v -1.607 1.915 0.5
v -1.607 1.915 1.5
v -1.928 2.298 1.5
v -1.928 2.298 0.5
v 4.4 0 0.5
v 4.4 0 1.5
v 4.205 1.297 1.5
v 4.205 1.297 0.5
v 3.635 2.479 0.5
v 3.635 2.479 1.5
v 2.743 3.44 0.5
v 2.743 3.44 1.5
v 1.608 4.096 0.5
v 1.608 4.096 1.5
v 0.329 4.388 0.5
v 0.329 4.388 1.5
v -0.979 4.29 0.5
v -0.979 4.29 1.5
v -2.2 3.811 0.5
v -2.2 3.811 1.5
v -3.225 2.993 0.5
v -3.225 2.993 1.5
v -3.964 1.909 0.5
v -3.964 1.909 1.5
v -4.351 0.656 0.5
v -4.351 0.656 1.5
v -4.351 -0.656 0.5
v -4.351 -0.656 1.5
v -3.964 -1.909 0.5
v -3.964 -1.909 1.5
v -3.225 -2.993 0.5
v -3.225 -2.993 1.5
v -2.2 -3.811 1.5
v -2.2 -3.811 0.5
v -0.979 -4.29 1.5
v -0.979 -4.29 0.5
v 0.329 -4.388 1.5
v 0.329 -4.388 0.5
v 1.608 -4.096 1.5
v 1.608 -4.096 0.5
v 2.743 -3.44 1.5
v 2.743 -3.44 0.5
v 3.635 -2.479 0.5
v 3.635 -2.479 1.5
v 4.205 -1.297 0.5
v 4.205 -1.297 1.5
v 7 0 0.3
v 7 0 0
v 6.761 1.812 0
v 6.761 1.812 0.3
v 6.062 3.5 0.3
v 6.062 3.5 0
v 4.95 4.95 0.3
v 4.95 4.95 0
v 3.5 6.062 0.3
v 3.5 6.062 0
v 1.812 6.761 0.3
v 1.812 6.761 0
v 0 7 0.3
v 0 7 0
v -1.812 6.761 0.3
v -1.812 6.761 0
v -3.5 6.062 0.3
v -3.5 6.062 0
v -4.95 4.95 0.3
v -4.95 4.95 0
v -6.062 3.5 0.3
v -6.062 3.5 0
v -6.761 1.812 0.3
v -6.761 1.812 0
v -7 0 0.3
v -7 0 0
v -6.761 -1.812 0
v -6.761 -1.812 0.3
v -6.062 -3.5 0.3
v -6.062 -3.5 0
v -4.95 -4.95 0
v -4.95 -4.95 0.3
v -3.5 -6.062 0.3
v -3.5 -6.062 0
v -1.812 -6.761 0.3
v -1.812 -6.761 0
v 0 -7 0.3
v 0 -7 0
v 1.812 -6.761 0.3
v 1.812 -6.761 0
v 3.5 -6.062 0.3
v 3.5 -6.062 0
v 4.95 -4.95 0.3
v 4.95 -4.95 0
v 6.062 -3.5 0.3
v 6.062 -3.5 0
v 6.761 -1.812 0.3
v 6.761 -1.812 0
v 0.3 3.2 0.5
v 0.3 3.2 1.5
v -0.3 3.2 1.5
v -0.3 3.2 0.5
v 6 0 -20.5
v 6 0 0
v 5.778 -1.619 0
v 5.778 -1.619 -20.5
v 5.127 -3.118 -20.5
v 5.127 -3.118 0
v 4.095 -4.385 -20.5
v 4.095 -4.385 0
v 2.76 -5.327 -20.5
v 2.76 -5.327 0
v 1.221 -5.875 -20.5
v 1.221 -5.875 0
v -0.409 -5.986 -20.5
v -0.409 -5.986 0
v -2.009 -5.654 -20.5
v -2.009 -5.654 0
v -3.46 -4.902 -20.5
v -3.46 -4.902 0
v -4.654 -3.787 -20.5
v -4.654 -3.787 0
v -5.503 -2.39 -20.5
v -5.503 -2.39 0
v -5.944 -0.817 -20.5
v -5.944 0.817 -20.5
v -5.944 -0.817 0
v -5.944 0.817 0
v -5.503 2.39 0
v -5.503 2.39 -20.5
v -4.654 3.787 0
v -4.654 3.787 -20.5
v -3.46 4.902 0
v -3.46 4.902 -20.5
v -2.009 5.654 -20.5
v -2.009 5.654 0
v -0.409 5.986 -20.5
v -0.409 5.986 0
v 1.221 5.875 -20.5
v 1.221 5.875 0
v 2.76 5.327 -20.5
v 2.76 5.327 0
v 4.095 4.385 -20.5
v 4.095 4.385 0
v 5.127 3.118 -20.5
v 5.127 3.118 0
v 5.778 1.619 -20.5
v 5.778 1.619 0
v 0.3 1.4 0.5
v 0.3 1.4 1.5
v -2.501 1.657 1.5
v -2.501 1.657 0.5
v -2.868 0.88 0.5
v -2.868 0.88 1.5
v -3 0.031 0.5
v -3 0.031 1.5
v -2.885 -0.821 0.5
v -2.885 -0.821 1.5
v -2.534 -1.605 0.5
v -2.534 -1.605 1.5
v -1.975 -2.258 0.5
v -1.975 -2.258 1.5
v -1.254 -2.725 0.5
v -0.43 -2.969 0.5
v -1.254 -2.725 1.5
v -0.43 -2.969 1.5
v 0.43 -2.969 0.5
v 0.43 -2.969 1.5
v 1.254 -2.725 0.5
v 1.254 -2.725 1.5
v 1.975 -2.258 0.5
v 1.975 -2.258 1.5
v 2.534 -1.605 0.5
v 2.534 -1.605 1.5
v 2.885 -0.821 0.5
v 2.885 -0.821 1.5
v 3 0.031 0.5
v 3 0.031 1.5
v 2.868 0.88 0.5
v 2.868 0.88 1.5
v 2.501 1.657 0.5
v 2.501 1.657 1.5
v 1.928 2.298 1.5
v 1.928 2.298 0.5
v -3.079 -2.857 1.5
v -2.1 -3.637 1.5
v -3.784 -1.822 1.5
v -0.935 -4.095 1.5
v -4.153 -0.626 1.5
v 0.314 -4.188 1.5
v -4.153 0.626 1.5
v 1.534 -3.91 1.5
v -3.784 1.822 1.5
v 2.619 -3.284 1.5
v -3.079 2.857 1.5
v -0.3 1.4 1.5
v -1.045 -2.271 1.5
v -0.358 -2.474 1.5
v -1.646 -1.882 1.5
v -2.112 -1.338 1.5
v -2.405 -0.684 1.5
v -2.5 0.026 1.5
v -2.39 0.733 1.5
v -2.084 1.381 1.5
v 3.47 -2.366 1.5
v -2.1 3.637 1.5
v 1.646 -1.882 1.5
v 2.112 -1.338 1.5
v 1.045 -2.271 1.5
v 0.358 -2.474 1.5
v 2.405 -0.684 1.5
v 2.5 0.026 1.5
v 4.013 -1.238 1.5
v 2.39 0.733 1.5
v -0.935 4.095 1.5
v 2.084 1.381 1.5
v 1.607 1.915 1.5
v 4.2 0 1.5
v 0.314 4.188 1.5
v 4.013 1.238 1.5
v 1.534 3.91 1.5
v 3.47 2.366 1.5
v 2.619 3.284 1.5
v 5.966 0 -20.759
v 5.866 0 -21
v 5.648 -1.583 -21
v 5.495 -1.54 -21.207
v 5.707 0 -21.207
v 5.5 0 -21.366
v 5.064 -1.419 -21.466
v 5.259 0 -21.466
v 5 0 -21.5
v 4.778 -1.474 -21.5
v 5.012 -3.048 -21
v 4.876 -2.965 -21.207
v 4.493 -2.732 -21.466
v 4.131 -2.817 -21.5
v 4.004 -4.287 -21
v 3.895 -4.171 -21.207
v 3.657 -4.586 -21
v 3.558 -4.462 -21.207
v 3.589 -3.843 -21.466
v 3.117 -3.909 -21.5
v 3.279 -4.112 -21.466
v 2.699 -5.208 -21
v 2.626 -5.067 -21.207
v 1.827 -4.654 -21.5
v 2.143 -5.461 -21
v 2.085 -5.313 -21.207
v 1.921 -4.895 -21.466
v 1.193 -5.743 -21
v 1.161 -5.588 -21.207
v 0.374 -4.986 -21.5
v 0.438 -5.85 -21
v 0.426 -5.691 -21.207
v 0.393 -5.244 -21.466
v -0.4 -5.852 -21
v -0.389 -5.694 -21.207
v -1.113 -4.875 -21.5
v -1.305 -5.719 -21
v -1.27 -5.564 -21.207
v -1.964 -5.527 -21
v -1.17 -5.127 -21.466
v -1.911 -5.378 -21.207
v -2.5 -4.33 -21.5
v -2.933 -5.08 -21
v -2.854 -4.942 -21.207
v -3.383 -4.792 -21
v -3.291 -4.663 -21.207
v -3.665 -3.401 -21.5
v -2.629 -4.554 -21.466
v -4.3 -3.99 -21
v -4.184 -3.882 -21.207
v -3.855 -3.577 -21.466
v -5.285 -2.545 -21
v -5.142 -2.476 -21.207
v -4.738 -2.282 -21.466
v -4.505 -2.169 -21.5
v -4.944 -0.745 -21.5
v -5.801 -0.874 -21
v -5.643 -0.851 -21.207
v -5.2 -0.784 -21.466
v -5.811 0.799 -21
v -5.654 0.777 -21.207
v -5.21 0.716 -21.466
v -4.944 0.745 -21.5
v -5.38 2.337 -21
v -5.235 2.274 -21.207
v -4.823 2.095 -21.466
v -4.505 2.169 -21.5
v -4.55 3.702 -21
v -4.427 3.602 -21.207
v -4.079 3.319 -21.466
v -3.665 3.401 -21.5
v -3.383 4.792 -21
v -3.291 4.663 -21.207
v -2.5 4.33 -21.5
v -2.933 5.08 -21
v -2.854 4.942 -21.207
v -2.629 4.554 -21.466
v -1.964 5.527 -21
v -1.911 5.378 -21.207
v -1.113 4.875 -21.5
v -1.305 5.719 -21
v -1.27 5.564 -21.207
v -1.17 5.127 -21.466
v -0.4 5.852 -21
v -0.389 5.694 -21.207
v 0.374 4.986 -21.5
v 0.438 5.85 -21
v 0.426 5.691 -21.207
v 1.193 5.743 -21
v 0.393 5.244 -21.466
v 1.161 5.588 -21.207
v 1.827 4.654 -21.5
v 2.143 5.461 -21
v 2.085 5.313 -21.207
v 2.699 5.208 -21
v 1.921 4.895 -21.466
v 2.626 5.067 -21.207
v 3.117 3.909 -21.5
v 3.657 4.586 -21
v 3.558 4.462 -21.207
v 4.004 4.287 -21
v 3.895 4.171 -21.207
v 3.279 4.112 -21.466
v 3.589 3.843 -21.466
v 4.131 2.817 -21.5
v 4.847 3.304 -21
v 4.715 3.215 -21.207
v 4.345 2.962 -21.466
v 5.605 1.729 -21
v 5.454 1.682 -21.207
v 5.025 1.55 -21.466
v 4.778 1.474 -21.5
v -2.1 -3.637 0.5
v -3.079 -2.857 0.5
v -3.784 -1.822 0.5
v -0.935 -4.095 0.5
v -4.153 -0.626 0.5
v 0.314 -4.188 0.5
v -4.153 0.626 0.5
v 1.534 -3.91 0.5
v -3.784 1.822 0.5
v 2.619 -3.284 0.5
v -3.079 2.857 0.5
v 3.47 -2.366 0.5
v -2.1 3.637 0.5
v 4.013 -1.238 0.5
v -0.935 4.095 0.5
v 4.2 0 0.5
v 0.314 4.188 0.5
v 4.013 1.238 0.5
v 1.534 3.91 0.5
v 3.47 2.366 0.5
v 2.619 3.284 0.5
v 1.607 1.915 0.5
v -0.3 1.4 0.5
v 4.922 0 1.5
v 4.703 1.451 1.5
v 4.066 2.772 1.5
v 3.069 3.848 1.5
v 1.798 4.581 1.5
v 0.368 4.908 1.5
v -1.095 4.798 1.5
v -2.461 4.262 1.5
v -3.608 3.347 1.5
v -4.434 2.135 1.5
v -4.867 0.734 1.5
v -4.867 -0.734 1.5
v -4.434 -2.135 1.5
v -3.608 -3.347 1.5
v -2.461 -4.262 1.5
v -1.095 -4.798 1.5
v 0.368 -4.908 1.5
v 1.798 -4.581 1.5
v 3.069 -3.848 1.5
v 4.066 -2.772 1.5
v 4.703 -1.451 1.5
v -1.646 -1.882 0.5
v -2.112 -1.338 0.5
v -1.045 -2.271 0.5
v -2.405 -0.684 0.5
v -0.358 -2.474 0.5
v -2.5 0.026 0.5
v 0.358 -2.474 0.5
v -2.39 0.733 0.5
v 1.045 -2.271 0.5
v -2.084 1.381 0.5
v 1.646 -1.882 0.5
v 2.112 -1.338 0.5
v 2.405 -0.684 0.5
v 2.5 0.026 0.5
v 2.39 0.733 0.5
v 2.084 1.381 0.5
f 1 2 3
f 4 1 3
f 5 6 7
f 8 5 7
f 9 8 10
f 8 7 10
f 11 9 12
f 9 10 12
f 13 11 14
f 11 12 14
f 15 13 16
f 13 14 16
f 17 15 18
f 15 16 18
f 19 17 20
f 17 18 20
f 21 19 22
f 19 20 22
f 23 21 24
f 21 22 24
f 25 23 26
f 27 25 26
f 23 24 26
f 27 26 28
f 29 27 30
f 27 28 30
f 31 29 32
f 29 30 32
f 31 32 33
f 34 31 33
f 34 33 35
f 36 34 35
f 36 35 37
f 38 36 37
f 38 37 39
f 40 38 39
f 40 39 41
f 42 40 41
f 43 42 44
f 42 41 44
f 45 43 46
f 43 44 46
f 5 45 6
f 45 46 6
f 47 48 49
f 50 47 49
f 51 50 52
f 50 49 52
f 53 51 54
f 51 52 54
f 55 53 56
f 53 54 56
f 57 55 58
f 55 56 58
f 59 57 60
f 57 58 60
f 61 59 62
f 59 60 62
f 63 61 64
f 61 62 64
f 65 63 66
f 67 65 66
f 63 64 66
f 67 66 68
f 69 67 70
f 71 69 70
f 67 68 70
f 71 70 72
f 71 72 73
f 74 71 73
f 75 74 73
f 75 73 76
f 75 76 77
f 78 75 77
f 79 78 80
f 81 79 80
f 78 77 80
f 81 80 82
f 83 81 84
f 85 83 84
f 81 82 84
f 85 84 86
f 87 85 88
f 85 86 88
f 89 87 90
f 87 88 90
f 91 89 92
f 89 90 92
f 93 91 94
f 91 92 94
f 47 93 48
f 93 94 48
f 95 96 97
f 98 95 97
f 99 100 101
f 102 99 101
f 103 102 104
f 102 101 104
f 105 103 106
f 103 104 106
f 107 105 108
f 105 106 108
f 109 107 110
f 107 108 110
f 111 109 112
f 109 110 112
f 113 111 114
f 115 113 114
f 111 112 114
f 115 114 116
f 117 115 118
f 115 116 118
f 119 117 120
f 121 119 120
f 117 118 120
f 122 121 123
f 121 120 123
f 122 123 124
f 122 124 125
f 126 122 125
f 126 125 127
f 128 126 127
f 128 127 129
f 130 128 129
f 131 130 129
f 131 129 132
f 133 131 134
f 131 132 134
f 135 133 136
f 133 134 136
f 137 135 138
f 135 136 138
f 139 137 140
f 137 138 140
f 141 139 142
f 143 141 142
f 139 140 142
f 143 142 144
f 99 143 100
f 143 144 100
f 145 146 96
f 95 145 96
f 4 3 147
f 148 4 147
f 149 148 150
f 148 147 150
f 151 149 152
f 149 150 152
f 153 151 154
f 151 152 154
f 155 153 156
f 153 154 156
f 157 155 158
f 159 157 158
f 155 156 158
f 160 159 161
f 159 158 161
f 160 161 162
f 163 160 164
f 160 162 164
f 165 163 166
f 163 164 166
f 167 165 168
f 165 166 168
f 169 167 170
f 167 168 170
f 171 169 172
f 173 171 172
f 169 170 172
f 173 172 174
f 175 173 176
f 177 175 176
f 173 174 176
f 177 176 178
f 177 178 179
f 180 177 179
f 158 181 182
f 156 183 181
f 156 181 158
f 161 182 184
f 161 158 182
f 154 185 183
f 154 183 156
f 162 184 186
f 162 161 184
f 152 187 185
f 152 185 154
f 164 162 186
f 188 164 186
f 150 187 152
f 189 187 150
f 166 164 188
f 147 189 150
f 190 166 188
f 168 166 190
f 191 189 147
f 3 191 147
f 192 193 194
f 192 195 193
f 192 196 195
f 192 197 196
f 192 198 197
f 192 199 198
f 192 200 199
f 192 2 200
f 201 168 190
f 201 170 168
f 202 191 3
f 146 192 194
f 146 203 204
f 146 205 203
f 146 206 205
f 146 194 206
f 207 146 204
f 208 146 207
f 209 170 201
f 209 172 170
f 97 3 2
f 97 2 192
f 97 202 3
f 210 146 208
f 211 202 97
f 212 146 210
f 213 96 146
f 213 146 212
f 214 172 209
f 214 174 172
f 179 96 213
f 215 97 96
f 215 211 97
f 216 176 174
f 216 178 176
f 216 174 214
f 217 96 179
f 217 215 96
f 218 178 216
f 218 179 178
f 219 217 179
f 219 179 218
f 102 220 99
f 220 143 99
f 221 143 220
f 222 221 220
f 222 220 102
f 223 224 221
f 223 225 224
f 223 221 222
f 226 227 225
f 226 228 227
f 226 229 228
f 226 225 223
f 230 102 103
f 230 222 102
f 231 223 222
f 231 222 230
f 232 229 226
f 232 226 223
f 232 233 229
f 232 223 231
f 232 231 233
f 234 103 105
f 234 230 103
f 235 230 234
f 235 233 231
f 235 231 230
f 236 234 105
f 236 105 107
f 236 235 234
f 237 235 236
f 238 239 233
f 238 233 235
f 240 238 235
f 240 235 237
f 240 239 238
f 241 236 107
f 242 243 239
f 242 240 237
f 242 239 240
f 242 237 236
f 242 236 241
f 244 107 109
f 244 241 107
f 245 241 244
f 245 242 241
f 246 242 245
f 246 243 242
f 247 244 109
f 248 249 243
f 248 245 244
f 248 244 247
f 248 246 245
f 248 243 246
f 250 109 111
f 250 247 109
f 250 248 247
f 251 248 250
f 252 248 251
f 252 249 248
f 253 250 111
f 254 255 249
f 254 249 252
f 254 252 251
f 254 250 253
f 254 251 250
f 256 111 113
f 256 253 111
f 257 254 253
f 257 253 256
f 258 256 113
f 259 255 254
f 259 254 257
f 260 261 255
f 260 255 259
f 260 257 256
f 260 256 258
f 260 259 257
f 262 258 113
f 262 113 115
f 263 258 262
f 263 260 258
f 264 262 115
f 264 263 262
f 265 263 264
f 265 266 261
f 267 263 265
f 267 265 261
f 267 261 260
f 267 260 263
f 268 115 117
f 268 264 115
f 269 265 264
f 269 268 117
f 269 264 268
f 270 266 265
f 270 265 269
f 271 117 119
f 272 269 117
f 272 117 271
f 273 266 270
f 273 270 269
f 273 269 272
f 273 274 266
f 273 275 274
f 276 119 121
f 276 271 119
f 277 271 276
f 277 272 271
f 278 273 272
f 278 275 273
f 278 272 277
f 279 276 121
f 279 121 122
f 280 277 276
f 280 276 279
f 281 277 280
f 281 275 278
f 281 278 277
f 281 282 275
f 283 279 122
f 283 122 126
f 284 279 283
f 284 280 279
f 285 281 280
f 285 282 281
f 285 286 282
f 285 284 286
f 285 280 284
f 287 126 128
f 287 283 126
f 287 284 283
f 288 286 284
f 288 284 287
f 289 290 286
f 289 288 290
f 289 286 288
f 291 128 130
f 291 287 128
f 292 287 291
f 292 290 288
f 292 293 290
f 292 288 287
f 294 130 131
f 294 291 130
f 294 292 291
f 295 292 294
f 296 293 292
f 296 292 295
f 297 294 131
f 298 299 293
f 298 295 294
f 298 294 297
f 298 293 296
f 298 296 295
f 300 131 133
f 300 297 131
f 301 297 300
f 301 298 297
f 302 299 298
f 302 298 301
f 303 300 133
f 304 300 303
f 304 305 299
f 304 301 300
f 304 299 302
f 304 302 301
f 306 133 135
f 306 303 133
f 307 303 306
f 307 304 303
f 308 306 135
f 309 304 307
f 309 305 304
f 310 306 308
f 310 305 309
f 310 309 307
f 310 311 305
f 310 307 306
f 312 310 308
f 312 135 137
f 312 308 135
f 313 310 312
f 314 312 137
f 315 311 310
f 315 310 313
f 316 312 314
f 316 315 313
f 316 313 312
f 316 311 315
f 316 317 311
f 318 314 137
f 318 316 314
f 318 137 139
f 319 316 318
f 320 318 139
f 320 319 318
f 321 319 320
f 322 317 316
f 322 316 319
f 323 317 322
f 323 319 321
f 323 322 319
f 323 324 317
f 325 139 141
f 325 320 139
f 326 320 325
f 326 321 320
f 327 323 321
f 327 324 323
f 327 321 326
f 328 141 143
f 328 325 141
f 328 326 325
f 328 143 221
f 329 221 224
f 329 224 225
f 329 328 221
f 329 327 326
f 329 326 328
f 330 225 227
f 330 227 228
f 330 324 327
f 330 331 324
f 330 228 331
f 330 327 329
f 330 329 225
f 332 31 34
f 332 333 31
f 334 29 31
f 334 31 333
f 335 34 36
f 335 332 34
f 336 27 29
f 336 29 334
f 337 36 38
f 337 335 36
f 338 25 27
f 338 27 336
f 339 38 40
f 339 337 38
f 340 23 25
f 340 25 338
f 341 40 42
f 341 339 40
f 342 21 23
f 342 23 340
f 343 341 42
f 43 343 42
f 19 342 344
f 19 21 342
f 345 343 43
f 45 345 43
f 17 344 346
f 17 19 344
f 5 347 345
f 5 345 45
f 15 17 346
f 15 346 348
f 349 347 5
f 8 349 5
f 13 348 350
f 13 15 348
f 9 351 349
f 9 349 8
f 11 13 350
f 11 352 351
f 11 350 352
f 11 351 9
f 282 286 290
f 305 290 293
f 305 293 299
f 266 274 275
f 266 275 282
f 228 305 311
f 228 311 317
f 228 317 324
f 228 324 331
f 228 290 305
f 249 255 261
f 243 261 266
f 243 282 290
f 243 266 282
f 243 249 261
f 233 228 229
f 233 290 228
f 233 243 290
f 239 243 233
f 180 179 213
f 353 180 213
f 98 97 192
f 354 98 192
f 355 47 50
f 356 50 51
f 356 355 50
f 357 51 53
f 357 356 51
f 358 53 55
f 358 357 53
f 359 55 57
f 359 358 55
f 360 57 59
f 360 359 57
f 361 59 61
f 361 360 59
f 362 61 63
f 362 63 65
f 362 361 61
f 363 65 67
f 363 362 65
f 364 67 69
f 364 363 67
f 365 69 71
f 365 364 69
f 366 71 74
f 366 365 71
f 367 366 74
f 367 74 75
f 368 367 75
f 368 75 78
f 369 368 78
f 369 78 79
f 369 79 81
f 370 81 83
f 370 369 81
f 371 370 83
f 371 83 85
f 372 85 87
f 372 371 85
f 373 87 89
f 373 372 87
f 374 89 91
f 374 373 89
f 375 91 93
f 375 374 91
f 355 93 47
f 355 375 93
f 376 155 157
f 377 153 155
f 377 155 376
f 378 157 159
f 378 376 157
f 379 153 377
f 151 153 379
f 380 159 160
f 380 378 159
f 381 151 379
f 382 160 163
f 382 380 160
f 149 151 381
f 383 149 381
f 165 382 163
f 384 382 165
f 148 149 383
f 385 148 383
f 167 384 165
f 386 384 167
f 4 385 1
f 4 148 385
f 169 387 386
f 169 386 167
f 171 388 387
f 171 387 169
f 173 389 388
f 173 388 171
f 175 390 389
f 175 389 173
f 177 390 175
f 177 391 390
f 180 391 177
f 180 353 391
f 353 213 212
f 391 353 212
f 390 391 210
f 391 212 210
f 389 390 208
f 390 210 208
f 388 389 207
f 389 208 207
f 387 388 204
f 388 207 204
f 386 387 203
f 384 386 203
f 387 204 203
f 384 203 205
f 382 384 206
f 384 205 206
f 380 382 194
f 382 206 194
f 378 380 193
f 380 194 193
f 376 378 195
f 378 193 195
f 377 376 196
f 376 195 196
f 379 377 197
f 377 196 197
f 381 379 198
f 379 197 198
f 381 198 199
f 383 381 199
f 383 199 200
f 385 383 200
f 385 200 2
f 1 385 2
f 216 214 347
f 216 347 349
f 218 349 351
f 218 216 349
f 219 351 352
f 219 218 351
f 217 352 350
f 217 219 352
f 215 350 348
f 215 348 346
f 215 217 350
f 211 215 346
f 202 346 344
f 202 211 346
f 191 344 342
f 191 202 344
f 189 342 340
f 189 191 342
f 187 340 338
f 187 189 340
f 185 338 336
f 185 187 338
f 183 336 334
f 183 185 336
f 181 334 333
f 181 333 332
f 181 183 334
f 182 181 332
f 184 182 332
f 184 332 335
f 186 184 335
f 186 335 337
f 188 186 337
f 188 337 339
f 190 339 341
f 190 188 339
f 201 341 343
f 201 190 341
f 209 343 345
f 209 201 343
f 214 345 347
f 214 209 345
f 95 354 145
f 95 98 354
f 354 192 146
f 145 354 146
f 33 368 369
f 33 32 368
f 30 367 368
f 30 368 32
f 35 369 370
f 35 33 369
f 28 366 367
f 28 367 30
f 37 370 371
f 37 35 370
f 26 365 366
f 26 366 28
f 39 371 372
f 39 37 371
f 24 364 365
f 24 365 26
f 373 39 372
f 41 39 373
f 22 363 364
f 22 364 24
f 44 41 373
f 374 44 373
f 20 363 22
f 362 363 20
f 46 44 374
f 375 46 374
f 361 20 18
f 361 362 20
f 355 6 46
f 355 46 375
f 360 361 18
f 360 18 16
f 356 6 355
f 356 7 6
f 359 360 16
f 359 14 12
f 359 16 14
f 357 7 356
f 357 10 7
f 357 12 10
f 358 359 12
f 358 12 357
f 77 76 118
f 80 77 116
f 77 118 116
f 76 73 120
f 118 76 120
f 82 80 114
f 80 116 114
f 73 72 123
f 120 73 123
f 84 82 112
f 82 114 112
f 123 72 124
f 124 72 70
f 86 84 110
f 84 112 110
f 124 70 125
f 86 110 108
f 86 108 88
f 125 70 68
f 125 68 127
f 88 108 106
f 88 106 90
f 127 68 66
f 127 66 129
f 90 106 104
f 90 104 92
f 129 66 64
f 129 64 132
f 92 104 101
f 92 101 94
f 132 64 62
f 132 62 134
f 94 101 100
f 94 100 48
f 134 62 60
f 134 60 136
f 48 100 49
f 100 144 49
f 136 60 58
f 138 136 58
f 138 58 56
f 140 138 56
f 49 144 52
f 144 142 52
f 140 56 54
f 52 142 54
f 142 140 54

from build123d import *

# Parameters (mm, degrees)
SKETCH_1_R          = 7
EXTRUDE_1_DEPTH     = 1.5
CHAMFER_1_SIZE      = 1.2
CHAMFER_1_SIZE2     = 2.078460969
SKETCH_2_R          = 4.4
SKETCH_2_R_2        = 4.2
CUT_EXTRUDE_1_DEPTH = 1
SKETCH_3_R          = 6
EXTRUDE_2_DEPTH     = 21.5
FILLET_1_R          = 1


with BuildPart() as part:
    # 草图1 → 凸台-拉伸1 (new body)
    with BuildSketch(Plane.XY):
        Circle(SKETCH_1_R)
    extrude(amount=EXTRUDE_1_DEPTH)

    # 倒角1
    chamfer_1_edges = [part.edges().sort_by_distance(p)[0] for p in [
        (-7, 0, 1.5),
    ]]
    chamfer_1_side = [part.faces().sort_by_distance(p)[0] for p in [
        (-7, 0, 0.75),
    ]]
    chamfer(chamfer_1_edges, length=CHAMFER_1_SIZE, length2=CHAMFER_1_SIZE2, reference=chamfer_1_side[0])

    # 草图2 → 切除-拉伸1 (cut)
    # profile 1 of 3: a face of its own
    with BuildSketch(Plane.XY.offset(1.5)):
        Circle(SKETCH_2_R)
        Circle(SKETCH_2_R_2, mode=Mode.SUBTRACT)
    # profile 2 of 3: a face of its own
    with BuildSketch(Plane.XY.offset(1.5)):
        with BuildLine():
            Line((-1.606969024, 1.915111108), (-1.928362829, 2.298133329))
            ThreePointArc((-1.928362829, 2.298133329), (0, -3), (1.928362829, 2.298133329))
            Line((1.928362829, 2.298133329), (1.606969024, 1.915111108))
            ThreePointArc((1.606969024, 1.915111108), (0, -2.5), (-1.606969024, 1.915111108))
        make_face()
    # profile 3 of 3: a face of its own
    with BuildSketch(Plane.XY.offset(1.5)):
        Polygon((-0.3, 1.4), (0.3, 1.4), (0.3, 3.2), (0, 3.2), (-0.3, 3.2), align=None)
    extrude(amount=-CUT_EXTRUDE_1_DEPTH, mode=Mode.SUBTRACT)

    # 草图3 → 凸台-拉伸2 (add)
    with BuildSketch(Plane(origin=(0, 0, 0), x_dir=(-1, 0, 0), z_dir=(0, 0, -1))):
        with Locations(Location((0, 0, 0), (0, 0, 180))):
            Circle(SKETCH_3_R)
    extrude(amount=EXTRUDE_2_DEPTH)

    # 圆角1
    fillet_1_edges = [part.edges().sort_by_distance(p)[0] for p in [
        (-6, 0, -21.5),
    ]]
    fillet(fillet_1_edges, radius=FILLET_1_R)


solid = part.part
